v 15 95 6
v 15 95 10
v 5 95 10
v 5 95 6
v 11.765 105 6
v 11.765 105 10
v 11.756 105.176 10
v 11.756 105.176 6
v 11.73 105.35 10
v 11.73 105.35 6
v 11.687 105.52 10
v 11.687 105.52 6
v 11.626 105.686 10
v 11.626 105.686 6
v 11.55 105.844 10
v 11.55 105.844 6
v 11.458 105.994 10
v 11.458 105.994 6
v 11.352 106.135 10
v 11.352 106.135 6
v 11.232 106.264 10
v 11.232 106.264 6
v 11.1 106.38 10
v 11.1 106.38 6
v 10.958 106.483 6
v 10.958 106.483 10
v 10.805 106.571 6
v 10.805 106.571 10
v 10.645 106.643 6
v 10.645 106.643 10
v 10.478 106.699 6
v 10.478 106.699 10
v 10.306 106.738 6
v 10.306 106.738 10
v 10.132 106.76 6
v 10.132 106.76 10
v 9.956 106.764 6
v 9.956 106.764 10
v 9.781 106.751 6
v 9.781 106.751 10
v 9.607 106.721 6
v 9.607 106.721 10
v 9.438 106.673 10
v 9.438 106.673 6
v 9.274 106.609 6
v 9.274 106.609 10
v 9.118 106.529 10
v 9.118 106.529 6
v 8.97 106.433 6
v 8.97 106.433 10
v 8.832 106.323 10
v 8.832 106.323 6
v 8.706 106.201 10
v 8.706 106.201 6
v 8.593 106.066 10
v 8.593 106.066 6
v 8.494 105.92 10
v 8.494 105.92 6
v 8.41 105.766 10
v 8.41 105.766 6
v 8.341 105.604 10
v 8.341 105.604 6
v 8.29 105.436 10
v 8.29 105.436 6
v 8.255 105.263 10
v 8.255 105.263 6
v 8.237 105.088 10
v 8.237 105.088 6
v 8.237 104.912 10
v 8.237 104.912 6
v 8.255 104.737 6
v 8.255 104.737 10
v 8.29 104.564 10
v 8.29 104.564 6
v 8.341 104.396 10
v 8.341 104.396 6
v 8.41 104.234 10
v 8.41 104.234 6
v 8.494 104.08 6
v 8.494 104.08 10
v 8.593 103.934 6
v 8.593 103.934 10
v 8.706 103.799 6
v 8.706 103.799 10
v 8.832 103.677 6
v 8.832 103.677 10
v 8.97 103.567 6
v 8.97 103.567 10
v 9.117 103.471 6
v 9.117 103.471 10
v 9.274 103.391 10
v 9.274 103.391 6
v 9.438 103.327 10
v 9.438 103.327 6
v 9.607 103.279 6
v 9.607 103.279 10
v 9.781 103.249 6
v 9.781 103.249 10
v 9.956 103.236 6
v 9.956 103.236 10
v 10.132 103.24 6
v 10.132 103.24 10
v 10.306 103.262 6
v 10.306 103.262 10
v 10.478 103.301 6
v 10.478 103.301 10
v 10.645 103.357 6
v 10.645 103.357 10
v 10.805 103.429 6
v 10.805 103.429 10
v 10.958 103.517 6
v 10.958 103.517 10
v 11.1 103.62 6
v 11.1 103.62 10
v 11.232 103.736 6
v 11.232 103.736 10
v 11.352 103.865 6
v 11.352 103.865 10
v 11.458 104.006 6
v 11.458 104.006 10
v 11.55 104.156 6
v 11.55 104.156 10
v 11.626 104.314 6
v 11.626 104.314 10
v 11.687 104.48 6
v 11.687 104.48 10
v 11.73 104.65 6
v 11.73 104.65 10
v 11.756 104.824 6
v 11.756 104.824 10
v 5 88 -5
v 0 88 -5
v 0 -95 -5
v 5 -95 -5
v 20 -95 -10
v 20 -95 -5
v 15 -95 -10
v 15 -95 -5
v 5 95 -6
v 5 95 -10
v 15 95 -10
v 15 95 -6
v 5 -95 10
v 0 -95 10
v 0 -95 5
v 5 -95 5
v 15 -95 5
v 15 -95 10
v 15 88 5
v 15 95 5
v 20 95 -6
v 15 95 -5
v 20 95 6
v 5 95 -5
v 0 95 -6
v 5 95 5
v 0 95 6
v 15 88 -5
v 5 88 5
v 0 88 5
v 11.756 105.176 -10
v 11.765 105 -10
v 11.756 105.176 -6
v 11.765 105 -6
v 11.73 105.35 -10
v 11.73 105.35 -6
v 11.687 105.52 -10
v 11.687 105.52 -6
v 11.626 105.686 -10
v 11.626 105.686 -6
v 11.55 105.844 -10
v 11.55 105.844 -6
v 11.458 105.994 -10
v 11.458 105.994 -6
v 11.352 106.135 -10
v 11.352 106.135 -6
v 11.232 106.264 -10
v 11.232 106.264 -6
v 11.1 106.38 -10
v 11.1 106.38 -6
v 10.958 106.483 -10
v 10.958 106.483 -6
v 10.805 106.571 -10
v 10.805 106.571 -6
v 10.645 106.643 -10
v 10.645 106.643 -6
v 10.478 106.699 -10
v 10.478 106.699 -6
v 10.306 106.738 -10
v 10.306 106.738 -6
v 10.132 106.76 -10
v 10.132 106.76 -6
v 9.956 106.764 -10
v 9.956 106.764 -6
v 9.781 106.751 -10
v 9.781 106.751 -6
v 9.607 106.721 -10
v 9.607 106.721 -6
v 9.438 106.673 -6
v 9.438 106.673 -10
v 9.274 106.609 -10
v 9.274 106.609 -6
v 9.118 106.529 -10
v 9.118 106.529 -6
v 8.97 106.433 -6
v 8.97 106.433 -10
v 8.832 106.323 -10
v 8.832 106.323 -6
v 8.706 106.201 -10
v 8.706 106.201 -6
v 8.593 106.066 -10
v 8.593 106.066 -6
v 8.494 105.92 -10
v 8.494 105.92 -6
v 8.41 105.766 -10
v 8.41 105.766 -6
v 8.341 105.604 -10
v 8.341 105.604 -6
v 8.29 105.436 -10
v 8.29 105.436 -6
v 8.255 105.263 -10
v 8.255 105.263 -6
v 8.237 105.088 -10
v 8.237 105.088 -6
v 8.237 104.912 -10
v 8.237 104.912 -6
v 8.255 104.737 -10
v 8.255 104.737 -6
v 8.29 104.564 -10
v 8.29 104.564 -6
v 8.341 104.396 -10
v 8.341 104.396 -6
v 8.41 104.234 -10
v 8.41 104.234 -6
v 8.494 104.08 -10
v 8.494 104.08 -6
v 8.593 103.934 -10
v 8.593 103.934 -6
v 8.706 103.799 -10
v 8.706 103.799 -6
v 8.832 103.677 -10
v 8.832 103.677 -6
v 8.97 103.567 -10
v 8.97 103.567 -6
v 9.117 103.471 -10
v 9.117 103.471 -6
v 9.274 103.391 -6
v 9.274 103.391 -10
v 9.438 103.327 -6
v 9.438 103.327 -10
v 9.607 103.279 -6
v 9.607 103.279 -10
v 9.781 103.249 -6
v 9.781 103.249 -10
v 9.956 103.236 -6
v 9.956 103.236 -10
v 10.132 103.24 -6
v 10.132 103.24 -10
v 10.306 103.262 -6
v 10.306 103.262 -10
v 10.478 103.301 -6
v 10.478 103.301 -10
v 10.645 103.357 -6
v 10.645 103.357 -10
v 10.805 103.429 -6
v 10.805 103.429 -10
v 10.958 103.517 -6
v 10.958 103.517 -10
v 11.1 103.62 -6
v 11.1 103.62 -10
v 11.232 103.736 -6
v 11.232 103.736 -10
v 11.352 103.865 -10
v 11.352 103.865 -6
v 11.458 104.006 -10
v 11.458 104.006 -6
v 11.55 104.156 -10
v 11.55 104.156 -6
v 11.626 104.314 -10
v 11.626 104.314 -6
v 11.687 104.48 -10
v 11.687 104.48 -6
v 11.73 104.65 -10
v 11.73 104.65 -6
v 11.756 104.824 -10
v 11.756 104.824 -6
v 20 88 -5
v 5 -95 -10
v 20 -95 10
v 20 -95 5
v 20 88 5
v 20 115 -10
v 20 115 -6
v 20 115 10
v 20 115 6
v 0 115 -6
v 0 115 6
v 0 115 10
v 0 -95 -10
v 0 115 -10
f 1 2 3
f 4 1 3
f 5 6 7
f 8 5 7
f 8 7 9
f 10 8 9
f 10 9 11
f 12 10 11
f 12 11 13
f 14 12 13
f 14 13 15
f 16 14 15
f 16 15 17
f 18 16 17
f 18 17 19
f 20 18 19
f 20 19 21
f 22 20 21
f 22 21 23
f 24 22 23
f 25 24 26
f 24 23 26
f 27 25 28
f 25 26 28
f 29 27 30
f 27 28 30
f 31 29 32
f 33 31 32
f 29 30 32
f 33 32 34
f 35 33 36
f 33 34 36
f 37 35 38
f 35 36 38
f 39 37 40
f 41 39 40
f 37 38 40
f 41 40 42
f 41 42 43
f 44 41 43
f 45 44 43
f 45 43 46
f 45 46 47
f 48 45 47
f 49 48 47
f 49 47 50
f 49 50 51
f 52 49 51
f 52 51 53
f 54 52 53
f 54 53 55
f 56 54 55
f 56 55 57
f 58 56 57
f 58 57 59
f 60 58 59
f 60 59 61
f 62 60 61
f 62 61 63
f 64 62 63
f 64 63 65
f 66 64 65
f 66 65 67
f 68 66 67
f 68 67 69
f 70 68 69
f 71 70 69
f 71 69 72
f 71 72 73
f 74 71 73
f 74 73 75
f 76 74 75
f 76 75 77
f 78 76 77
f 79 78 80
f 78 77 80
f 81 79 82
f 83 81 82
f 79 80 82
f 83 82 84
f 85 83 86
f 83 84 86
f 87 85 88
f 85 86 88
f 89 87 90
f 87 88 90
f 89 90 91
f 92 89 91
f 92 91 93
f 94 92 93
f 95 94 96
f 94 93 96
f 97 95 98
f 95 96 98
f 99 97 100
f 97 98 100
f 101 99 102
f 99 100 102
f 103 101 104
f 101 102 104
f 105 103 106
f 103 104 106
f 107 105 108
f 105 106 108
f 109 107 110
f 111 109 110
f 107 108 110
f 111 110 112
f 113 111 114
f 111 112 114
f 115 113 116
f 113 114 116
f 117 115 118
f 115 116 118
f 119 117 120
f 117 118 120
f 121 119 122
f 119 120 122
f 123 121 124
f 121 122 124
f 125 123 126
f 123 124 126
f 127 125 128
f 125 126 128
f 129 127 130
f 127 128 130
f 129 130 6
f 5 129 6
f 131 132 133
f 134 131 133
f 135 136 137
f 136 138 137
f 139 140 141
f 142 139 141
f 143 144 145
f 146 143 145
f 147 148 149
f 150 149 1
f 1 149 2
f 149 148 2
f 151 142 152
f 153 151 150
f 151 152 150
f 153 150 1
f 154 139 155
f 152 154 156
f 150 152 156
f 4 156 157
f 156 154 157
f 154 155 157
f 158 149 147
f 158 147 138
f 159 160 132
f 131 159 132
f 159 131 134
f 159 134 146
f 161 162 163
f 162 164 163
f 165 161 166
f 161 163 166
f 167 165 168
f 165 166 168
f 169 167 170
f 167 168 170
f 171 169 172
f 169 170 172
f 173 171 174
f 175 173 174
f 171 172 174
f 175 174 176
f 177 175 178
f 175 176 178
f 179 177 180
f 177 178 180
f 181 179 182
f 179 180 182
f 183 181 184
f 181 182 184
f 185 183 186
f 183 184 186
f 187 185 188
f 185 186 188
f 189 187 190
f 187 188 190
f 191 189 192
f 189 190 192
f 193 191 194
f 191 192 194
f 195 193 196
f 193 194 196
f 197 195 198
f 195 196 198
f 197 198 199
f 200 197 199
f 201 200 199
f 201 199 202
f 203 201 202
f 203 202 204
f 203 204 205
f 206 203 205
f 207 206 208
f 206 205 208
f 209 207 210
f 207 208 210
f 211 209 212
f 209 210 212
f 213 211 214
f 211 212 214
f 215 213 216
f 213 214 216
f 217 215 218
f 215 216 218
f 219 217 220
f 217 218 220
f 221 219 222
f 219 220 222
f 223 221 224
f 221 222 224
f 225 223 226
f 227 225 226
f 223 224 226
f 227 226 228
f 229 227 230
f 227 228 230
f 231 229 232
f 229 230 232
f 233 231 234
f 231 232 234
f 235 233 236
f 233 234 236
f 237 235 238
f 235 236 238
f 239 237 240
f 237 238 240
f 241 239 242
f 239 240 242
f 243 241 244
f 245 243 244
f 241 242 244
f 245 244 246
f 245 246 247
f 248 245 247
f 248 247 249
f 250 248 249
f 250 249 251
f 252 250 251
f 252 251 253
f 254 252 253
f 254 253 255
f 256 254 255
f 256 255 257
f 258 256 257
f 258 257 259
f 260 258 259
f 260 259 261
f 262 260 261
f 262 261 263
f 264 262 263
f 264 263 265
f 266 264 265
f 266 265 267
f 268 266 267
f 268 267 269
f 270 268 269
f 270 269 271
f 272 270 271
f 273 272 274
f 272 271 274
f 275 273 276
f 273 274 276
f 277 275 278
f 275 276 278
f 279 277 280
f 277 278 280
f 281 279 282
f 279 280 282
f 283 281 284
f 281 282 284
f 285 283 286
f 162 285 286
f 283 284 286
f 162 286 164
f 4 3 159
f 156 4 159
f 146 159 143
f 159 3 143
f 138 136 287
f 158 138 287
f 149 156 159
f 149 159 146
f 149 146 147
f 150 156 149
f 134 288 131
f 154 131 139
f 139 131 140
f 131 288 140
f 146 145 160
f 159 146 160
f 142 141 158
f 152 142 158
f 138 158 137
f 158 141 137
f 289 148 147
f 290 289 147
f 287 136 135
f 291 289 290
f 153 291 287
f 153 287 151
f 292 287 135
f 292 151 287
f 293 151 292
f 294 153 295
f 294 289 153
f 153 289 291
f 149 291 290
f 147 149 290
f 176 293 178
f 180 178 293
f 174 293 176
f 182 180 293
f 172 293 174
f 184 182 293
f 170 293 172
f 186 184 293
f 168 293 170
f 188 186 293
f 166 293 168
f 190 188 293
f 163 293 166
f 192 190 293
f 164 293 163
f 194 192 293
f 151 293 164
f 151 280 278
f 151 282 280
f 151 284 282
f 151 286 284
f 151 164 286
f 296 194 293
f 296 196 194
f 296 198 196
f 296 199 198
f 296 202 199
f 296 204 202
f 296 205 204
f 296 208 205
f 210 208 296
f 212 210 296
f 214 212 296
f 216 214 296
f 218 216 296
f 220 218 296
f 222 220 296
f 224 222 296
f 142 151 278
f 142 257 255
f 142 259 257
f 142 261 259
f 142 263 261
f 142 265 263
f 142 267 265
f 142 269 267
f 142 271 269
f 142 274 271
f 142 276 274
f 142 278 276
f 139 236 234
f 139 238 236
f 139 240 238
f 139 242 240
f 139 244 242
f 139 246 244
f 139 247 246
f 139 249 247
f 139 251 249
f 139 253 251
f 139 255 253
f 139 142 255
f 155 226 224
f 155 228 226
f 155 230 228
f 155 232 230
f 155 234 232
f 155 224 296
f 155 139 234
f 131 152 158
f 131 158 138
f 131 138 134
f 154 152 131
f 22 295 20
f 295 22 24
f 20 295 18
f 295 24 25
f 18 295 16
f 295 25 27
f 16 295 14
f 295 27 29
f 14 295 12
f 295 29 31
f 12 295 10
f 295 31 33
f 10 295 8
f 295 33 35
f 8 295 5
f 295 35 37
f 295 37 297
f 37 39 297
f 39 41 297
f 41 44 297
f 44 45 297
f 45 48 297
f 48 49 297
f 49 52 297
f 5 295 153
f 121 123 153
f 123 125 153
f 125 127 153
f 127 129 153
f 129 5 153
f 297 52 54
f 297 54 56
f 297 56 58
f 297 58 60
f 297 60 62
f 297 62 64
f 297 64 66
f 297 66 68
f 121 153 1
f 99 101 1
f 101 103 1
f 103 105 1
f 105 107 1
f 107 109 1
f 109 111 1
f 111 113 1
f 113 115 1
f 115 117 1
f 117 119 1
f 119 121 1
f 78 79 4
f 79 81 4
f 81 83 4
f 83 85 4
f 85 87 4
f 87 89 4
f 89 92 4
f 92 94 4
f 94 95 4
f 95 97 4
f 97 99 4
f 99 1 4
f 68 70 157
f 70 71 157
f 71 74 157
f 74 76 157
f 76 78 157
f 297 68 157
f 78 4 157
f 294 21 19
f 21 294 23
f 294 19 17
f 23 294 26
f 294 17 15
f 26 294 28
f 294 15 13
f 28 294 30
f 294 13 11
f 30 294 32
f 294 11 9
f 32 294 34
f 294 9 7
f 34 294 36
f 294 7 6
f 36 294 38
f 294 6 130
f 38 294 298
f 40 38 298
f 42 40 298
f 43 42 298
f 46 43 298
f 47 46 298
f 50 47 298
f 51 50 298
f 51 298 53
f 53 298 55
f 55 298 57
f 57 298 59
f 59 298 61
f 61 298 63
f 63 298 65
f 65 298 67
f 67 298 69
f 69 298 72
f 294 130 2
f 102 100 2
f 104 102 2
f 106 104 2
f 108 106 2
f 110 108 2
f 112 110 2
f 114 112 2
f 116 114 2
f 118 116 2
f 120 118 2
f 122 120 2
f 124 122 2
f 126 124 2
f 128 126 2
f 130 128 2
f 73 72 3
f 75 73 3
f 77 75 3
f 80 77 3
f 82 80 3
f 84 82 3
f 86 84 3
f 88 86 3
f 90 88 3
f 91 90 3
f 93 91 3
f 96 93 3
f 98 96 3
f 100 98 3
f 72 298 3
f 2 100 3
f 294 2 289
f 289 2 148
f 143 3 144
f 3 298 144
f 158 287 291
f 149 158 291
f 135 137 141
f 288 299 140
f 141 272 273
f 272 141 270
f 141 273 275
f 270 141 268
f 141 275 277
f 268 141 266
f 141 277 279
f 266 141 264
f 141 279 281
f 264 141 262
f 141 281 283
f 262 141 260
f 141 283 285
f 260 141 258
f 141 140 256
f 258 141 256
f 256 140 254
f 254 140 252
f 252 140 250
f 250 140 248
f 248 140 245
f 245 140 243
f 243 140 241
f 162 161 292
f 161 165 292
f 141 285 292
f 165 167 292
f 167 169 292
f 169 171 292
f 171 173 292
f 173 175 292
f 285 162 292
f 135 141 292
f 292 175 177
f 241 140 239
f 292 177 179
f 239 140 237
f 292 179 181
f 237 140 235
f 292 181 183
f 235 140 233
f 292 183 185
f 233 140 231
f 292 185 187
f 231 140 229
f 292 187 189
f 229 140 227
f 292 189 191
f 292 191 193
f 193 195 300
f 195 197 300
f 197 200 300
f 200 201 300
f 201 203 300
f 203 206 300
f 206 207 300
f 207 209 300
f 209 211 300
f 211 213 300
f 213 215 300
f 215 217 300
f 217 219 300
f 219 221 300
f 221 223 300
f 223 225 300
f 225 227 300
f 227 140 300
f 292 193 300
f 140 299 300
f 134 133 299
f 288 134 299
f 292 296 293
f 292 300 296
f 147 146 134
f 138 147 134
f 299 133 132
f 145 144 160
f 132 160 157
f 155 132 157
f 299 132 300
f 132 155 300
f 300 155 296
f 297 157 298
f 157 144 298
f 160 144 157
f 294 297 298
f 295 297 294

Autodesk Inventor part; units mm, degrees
ref_plane "YZ Plane" through (0, 0, 0) normal (1, 0, 0) x (0, 1, 0)
ref_plane "XZ Plane" through (0, 0, 0) normal (0, 1, 0) x (-1, 0, 0)
ref_plane "XY Plane" through (0, 0, 0) normal (0, 0, 1) x (1, 0, 0)
sketch "Esquisse1" plane through (0, 0, 0) normal (1, 0, 0) x (0, 1, 0)
  line L0 (95, 10) -> (-95, 10)
  line L1 (-95, 10) -> (-95, -10)
  line L2 (-95, -10) -> (95, -10)
  line L3 (95, -10) -> (95, 10)
  line L4 (95, 10) -> (-95, -10)
  line L5 (-95, 10) -> (95, -10)
  point P0 (0, 0)
  point P1 (0, 0)
  point P2 (0, 0)
  dimension "d0" = 190
  dimension "d1" = 20
extrude "Extrusion1" add sketch "Esquisse1" along normal blind 20
sketch "Esquisse2" plane through (0, 95, 10) normal (0, 1, 0) x (1, 0, 0)
  line L0 (20, 20) -> (20, 0) projected
  line L1 (0, 0) -> (20, 0)
  line L2 (20, 0) -> (20, 4)
  line L3 (20, 4) -> (0, 4)
  line L4 (0, 4) -> (0, 0)
  line L5 (0, 10) -> (20, 10)
  line L6 (0, 20) -> (20, 20)
  line L7 (20, 20) -> (20, 16)
  line L8 (20, 16) -> (0, 16)
  line L9 (0, 16) -> (0, 20)
extrude "Extrusion2" add sketch "Esquisse2" along normal blind 20
sketch "Esquisse3" plane through (0, -95, 10) normal (0, 0, 1) x (1, 0, 0)
  circle A0 centre (10, 200) radius 1.765
  line L0 (0, 0) -> (0, 210) projected
  line L1 (0, 210) -> (20, 210) projected
  point P0 (0, 95)
  dimension "d6" = 3.53
  dimension "d7" = 10
  dimension "d8" = 10
extrude "Extrusion3" cut sketch "Esquisse3" against normal blind 78.75
sketch "Esquisse4" plane through (0, -95, 10) normal (0, 0, 1) x (1, 0, 0)
  line L0 (20, 190) -> (0, 190) projected
  line L1 (5, 0) -> (15, 0)
  line L2 (15, 0) -> (15, 190)
  line L3 (15, 190) -> (5, 190)
  line L4 (5, 190) -> (5, 0)
  point P0 (0, 95)
extrude "Extrusion4" cut sketch "Esquisse4" against normal blind 5
sketch "Esquisse5" plane through (20, -95, -10) normal (0, 0, -1) x (-1, 0, 0)
  line L0 (5, 0) -> (0, 0) projected
  line L1 (15, 0) -> (15, 190) projected
  line L2 (5, 0) -> (15, 0)
  line L3 (15, 0) -> (15, 190)
  line L4 (15, 190) -> (5, 190)
  line L5 (5, 190) -> (5, 0)
  point P0 (20, 95)
extrude "Extrusion5" cut sketch "Esquisse5" against normal blind 5
sketch "Esquisse6" plane through (20, 0, 0) normal (1, 0, 0) x (0, 0, -1)
  line L0 (-10, -95) -> (10, -95) projected
  line L1 (5, -95) -> (5, 95) projected
  line L2 (-5, -95) -> (5, -95)
  line L3 (5, -95) -> (5, 88)
  line L4 (5, 88) -> (-5, 88)
  line L5 (-5, 88) -> (-5, -95)
  point P0 (0, 0)
extrude "Extrusion6" cut sketch "Esquisse6" against normal blind 5
sketch "Esquisse7" plane through (0, 0, 0) normal (-1, 0, 0) x (0, 0, 1)
  line L0 (-5, 88) -> (-5, -95) projected
  line L1 (5, -95) -> (5, 95) projected
  line L2 (-5, -95) -> (5, -95)
  line L3 (5, -95) -> (5, 88)
  line L4 (5, 88) -> (-5, 88)
  line L5 (-5, 88) -> (-5, -95)
  point P0 (0, 0)
extrude "Extrusion7" cut sketch "Esquisse7" against normal blind 5
properties part number "rail_principal"
